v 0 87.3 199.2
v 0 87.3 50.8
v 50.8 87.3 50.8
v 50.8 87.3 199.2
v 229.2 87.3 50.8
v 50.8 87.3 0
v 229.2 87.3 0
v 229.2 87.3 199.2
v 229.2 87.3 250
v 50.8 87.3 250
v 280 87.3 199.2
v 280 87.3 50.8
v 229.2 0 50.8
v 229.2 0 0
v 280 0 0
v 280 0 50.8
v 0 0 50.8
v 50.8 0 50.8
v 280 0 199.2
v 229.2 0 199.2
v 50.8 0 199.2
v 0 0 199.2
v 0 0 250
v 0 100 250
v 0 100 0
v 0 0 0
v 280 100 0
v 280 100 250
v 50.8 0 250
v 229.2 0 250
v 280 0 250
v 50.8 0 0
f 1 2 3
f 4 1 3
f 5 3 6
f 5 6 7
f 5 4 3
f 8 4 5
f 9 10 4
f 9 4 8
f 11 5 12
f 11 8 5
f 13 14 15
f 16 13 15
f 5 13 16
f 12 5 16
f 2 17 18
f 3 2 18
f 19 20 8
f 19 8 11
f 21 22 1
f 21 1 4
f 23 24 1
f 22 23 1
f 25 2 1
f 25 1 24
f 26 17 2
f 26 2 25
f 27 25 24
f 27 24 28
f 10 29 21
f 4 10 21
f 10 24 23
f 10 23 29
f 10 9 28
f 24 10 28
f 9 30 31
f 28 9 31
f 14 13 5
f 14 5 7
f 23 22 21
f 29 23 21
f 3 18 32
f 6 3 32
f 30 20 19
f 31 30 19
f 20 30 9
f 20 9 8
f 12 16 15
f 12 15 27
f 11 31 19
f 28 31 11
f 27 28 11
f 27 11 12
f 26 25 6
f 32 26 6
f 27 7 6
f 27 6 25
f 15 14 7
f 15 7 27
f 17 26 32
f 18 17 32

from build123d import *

# Parameters (mm, degrees)
CROQUIS1_W                = 50.8
CROQUIS1_H                = 50.8
SALIENTE_EXTRUIR1_DEPTH   = 100
SALIENTE_EXTRUIR1_2_DEPTH = 100
SALIENTE_EXTRUIR1_3_DEPTH = 100
SALIENTE_EXTRUIR1_4_DEPTH = 100
SALIENTE_EXTRUIR2_REACH   = 390.458
CROQUIS2_W                = 280
CROQUIS2_H                = 12.7


with BuildPart() as part:
    # Croquis1 → Saliente-Extruir1 (new body)
    with BuildSketch(Plane(origin=(0, 0, 0), x_dir=(1, 0, 0), z_dir=(0, 1, 0))):
        with Locations((25.4, -25.4)):
            Rectangle(CROQUIS1_W, CROQUIS1_H)
    extrude(amount=SALIENTE_EXTRUIR1_DEPTH)


with BuildPart() as body_2:
    # Croquis1 → Saliente-Extruir1 2 (new body)
    with BuildSketch(Plane(origin=(0, 0, 0), x_dir=(1, 0, 0), z_dir=(0, 1, 0))):
        with Locations((254.6, -25.4)):
            Rectangle(CROQUIS1_W, CROQUIS1_H)
    extrude(amount=SALIENTE_EXTRUIR1_2_DEPTH)

    # Saliente-Extruir2: up to this face of the body (flat: up to its plane)
    saliente_extruir2_end = Plane(body_2.part.faces().sort_by_distance((254.6, 50, 0))[0])
    # Croquis2 → Saliente-Extruir2 (add, up to the picked face)
    with BuildSketch(Plane.XY.offset(250), mode=Mode.PRIVATE) as saliente_extruir2_sk1:
        with Locations((140, 93.65)):
            Rectangle(CROQUIS2_W, CROQUIS2_H)
    saliente_extruir2_tool1 = split(extrude(saliente_extruir2_sk1.sketch, amount=-SALIENTE_EXTRUIR2_REACH, mode=Mode.PRIVATE), bisect_by=saliente_extruir2_end, keep=Keep.BOTH, mode=Mode.PRIVATE)

    add(part.part)  # Saliente-Extruir2 merges part


with BuildPart() as body_3:
    # Croquis1 → Saliente-Extruir1 3 (new body)
    with BuildSketch(Plane(origin=(0, 0, 0), x_dir=(1, 0, 0), z_dir=(0, 1, 0))):
        with Locations((254.6, -224.6)):
            Rectangle(CROQUIS1_W, CROQUIS1_H)
    extrude(amount=SALIENTE_EXTRUIR1_3_DEPTH)


with BuildPart() as body_4:
    # Croquis1 → Saliente-Extruir1 4 (new body)
    with BuildSketch(Plane(origin=(0, 0, 0), x_dir=(1, 0, 0), z_dir=(0, 1, 0))):
        with Locations((25.4, -224.6)):
            Rectangle(CROQUIS1_W, CROQUIS1_H)
    extrude(amount=SALIENTE_EXTRUIR1_4_DEPTH)


with BuildPart() as body_2_1:
    add(body_2.part)

    add(body_3.part)  # Saliente-Extruir2 merges body 3

    add(body_4.part)  # Saliente-Extruir2 merges body 4
    add(saliente_extruir2_tool1.solids().sort_by(Axis((140, 93.65, 250), (0, 0, -1)))[0])


solid = body_2_1.part
